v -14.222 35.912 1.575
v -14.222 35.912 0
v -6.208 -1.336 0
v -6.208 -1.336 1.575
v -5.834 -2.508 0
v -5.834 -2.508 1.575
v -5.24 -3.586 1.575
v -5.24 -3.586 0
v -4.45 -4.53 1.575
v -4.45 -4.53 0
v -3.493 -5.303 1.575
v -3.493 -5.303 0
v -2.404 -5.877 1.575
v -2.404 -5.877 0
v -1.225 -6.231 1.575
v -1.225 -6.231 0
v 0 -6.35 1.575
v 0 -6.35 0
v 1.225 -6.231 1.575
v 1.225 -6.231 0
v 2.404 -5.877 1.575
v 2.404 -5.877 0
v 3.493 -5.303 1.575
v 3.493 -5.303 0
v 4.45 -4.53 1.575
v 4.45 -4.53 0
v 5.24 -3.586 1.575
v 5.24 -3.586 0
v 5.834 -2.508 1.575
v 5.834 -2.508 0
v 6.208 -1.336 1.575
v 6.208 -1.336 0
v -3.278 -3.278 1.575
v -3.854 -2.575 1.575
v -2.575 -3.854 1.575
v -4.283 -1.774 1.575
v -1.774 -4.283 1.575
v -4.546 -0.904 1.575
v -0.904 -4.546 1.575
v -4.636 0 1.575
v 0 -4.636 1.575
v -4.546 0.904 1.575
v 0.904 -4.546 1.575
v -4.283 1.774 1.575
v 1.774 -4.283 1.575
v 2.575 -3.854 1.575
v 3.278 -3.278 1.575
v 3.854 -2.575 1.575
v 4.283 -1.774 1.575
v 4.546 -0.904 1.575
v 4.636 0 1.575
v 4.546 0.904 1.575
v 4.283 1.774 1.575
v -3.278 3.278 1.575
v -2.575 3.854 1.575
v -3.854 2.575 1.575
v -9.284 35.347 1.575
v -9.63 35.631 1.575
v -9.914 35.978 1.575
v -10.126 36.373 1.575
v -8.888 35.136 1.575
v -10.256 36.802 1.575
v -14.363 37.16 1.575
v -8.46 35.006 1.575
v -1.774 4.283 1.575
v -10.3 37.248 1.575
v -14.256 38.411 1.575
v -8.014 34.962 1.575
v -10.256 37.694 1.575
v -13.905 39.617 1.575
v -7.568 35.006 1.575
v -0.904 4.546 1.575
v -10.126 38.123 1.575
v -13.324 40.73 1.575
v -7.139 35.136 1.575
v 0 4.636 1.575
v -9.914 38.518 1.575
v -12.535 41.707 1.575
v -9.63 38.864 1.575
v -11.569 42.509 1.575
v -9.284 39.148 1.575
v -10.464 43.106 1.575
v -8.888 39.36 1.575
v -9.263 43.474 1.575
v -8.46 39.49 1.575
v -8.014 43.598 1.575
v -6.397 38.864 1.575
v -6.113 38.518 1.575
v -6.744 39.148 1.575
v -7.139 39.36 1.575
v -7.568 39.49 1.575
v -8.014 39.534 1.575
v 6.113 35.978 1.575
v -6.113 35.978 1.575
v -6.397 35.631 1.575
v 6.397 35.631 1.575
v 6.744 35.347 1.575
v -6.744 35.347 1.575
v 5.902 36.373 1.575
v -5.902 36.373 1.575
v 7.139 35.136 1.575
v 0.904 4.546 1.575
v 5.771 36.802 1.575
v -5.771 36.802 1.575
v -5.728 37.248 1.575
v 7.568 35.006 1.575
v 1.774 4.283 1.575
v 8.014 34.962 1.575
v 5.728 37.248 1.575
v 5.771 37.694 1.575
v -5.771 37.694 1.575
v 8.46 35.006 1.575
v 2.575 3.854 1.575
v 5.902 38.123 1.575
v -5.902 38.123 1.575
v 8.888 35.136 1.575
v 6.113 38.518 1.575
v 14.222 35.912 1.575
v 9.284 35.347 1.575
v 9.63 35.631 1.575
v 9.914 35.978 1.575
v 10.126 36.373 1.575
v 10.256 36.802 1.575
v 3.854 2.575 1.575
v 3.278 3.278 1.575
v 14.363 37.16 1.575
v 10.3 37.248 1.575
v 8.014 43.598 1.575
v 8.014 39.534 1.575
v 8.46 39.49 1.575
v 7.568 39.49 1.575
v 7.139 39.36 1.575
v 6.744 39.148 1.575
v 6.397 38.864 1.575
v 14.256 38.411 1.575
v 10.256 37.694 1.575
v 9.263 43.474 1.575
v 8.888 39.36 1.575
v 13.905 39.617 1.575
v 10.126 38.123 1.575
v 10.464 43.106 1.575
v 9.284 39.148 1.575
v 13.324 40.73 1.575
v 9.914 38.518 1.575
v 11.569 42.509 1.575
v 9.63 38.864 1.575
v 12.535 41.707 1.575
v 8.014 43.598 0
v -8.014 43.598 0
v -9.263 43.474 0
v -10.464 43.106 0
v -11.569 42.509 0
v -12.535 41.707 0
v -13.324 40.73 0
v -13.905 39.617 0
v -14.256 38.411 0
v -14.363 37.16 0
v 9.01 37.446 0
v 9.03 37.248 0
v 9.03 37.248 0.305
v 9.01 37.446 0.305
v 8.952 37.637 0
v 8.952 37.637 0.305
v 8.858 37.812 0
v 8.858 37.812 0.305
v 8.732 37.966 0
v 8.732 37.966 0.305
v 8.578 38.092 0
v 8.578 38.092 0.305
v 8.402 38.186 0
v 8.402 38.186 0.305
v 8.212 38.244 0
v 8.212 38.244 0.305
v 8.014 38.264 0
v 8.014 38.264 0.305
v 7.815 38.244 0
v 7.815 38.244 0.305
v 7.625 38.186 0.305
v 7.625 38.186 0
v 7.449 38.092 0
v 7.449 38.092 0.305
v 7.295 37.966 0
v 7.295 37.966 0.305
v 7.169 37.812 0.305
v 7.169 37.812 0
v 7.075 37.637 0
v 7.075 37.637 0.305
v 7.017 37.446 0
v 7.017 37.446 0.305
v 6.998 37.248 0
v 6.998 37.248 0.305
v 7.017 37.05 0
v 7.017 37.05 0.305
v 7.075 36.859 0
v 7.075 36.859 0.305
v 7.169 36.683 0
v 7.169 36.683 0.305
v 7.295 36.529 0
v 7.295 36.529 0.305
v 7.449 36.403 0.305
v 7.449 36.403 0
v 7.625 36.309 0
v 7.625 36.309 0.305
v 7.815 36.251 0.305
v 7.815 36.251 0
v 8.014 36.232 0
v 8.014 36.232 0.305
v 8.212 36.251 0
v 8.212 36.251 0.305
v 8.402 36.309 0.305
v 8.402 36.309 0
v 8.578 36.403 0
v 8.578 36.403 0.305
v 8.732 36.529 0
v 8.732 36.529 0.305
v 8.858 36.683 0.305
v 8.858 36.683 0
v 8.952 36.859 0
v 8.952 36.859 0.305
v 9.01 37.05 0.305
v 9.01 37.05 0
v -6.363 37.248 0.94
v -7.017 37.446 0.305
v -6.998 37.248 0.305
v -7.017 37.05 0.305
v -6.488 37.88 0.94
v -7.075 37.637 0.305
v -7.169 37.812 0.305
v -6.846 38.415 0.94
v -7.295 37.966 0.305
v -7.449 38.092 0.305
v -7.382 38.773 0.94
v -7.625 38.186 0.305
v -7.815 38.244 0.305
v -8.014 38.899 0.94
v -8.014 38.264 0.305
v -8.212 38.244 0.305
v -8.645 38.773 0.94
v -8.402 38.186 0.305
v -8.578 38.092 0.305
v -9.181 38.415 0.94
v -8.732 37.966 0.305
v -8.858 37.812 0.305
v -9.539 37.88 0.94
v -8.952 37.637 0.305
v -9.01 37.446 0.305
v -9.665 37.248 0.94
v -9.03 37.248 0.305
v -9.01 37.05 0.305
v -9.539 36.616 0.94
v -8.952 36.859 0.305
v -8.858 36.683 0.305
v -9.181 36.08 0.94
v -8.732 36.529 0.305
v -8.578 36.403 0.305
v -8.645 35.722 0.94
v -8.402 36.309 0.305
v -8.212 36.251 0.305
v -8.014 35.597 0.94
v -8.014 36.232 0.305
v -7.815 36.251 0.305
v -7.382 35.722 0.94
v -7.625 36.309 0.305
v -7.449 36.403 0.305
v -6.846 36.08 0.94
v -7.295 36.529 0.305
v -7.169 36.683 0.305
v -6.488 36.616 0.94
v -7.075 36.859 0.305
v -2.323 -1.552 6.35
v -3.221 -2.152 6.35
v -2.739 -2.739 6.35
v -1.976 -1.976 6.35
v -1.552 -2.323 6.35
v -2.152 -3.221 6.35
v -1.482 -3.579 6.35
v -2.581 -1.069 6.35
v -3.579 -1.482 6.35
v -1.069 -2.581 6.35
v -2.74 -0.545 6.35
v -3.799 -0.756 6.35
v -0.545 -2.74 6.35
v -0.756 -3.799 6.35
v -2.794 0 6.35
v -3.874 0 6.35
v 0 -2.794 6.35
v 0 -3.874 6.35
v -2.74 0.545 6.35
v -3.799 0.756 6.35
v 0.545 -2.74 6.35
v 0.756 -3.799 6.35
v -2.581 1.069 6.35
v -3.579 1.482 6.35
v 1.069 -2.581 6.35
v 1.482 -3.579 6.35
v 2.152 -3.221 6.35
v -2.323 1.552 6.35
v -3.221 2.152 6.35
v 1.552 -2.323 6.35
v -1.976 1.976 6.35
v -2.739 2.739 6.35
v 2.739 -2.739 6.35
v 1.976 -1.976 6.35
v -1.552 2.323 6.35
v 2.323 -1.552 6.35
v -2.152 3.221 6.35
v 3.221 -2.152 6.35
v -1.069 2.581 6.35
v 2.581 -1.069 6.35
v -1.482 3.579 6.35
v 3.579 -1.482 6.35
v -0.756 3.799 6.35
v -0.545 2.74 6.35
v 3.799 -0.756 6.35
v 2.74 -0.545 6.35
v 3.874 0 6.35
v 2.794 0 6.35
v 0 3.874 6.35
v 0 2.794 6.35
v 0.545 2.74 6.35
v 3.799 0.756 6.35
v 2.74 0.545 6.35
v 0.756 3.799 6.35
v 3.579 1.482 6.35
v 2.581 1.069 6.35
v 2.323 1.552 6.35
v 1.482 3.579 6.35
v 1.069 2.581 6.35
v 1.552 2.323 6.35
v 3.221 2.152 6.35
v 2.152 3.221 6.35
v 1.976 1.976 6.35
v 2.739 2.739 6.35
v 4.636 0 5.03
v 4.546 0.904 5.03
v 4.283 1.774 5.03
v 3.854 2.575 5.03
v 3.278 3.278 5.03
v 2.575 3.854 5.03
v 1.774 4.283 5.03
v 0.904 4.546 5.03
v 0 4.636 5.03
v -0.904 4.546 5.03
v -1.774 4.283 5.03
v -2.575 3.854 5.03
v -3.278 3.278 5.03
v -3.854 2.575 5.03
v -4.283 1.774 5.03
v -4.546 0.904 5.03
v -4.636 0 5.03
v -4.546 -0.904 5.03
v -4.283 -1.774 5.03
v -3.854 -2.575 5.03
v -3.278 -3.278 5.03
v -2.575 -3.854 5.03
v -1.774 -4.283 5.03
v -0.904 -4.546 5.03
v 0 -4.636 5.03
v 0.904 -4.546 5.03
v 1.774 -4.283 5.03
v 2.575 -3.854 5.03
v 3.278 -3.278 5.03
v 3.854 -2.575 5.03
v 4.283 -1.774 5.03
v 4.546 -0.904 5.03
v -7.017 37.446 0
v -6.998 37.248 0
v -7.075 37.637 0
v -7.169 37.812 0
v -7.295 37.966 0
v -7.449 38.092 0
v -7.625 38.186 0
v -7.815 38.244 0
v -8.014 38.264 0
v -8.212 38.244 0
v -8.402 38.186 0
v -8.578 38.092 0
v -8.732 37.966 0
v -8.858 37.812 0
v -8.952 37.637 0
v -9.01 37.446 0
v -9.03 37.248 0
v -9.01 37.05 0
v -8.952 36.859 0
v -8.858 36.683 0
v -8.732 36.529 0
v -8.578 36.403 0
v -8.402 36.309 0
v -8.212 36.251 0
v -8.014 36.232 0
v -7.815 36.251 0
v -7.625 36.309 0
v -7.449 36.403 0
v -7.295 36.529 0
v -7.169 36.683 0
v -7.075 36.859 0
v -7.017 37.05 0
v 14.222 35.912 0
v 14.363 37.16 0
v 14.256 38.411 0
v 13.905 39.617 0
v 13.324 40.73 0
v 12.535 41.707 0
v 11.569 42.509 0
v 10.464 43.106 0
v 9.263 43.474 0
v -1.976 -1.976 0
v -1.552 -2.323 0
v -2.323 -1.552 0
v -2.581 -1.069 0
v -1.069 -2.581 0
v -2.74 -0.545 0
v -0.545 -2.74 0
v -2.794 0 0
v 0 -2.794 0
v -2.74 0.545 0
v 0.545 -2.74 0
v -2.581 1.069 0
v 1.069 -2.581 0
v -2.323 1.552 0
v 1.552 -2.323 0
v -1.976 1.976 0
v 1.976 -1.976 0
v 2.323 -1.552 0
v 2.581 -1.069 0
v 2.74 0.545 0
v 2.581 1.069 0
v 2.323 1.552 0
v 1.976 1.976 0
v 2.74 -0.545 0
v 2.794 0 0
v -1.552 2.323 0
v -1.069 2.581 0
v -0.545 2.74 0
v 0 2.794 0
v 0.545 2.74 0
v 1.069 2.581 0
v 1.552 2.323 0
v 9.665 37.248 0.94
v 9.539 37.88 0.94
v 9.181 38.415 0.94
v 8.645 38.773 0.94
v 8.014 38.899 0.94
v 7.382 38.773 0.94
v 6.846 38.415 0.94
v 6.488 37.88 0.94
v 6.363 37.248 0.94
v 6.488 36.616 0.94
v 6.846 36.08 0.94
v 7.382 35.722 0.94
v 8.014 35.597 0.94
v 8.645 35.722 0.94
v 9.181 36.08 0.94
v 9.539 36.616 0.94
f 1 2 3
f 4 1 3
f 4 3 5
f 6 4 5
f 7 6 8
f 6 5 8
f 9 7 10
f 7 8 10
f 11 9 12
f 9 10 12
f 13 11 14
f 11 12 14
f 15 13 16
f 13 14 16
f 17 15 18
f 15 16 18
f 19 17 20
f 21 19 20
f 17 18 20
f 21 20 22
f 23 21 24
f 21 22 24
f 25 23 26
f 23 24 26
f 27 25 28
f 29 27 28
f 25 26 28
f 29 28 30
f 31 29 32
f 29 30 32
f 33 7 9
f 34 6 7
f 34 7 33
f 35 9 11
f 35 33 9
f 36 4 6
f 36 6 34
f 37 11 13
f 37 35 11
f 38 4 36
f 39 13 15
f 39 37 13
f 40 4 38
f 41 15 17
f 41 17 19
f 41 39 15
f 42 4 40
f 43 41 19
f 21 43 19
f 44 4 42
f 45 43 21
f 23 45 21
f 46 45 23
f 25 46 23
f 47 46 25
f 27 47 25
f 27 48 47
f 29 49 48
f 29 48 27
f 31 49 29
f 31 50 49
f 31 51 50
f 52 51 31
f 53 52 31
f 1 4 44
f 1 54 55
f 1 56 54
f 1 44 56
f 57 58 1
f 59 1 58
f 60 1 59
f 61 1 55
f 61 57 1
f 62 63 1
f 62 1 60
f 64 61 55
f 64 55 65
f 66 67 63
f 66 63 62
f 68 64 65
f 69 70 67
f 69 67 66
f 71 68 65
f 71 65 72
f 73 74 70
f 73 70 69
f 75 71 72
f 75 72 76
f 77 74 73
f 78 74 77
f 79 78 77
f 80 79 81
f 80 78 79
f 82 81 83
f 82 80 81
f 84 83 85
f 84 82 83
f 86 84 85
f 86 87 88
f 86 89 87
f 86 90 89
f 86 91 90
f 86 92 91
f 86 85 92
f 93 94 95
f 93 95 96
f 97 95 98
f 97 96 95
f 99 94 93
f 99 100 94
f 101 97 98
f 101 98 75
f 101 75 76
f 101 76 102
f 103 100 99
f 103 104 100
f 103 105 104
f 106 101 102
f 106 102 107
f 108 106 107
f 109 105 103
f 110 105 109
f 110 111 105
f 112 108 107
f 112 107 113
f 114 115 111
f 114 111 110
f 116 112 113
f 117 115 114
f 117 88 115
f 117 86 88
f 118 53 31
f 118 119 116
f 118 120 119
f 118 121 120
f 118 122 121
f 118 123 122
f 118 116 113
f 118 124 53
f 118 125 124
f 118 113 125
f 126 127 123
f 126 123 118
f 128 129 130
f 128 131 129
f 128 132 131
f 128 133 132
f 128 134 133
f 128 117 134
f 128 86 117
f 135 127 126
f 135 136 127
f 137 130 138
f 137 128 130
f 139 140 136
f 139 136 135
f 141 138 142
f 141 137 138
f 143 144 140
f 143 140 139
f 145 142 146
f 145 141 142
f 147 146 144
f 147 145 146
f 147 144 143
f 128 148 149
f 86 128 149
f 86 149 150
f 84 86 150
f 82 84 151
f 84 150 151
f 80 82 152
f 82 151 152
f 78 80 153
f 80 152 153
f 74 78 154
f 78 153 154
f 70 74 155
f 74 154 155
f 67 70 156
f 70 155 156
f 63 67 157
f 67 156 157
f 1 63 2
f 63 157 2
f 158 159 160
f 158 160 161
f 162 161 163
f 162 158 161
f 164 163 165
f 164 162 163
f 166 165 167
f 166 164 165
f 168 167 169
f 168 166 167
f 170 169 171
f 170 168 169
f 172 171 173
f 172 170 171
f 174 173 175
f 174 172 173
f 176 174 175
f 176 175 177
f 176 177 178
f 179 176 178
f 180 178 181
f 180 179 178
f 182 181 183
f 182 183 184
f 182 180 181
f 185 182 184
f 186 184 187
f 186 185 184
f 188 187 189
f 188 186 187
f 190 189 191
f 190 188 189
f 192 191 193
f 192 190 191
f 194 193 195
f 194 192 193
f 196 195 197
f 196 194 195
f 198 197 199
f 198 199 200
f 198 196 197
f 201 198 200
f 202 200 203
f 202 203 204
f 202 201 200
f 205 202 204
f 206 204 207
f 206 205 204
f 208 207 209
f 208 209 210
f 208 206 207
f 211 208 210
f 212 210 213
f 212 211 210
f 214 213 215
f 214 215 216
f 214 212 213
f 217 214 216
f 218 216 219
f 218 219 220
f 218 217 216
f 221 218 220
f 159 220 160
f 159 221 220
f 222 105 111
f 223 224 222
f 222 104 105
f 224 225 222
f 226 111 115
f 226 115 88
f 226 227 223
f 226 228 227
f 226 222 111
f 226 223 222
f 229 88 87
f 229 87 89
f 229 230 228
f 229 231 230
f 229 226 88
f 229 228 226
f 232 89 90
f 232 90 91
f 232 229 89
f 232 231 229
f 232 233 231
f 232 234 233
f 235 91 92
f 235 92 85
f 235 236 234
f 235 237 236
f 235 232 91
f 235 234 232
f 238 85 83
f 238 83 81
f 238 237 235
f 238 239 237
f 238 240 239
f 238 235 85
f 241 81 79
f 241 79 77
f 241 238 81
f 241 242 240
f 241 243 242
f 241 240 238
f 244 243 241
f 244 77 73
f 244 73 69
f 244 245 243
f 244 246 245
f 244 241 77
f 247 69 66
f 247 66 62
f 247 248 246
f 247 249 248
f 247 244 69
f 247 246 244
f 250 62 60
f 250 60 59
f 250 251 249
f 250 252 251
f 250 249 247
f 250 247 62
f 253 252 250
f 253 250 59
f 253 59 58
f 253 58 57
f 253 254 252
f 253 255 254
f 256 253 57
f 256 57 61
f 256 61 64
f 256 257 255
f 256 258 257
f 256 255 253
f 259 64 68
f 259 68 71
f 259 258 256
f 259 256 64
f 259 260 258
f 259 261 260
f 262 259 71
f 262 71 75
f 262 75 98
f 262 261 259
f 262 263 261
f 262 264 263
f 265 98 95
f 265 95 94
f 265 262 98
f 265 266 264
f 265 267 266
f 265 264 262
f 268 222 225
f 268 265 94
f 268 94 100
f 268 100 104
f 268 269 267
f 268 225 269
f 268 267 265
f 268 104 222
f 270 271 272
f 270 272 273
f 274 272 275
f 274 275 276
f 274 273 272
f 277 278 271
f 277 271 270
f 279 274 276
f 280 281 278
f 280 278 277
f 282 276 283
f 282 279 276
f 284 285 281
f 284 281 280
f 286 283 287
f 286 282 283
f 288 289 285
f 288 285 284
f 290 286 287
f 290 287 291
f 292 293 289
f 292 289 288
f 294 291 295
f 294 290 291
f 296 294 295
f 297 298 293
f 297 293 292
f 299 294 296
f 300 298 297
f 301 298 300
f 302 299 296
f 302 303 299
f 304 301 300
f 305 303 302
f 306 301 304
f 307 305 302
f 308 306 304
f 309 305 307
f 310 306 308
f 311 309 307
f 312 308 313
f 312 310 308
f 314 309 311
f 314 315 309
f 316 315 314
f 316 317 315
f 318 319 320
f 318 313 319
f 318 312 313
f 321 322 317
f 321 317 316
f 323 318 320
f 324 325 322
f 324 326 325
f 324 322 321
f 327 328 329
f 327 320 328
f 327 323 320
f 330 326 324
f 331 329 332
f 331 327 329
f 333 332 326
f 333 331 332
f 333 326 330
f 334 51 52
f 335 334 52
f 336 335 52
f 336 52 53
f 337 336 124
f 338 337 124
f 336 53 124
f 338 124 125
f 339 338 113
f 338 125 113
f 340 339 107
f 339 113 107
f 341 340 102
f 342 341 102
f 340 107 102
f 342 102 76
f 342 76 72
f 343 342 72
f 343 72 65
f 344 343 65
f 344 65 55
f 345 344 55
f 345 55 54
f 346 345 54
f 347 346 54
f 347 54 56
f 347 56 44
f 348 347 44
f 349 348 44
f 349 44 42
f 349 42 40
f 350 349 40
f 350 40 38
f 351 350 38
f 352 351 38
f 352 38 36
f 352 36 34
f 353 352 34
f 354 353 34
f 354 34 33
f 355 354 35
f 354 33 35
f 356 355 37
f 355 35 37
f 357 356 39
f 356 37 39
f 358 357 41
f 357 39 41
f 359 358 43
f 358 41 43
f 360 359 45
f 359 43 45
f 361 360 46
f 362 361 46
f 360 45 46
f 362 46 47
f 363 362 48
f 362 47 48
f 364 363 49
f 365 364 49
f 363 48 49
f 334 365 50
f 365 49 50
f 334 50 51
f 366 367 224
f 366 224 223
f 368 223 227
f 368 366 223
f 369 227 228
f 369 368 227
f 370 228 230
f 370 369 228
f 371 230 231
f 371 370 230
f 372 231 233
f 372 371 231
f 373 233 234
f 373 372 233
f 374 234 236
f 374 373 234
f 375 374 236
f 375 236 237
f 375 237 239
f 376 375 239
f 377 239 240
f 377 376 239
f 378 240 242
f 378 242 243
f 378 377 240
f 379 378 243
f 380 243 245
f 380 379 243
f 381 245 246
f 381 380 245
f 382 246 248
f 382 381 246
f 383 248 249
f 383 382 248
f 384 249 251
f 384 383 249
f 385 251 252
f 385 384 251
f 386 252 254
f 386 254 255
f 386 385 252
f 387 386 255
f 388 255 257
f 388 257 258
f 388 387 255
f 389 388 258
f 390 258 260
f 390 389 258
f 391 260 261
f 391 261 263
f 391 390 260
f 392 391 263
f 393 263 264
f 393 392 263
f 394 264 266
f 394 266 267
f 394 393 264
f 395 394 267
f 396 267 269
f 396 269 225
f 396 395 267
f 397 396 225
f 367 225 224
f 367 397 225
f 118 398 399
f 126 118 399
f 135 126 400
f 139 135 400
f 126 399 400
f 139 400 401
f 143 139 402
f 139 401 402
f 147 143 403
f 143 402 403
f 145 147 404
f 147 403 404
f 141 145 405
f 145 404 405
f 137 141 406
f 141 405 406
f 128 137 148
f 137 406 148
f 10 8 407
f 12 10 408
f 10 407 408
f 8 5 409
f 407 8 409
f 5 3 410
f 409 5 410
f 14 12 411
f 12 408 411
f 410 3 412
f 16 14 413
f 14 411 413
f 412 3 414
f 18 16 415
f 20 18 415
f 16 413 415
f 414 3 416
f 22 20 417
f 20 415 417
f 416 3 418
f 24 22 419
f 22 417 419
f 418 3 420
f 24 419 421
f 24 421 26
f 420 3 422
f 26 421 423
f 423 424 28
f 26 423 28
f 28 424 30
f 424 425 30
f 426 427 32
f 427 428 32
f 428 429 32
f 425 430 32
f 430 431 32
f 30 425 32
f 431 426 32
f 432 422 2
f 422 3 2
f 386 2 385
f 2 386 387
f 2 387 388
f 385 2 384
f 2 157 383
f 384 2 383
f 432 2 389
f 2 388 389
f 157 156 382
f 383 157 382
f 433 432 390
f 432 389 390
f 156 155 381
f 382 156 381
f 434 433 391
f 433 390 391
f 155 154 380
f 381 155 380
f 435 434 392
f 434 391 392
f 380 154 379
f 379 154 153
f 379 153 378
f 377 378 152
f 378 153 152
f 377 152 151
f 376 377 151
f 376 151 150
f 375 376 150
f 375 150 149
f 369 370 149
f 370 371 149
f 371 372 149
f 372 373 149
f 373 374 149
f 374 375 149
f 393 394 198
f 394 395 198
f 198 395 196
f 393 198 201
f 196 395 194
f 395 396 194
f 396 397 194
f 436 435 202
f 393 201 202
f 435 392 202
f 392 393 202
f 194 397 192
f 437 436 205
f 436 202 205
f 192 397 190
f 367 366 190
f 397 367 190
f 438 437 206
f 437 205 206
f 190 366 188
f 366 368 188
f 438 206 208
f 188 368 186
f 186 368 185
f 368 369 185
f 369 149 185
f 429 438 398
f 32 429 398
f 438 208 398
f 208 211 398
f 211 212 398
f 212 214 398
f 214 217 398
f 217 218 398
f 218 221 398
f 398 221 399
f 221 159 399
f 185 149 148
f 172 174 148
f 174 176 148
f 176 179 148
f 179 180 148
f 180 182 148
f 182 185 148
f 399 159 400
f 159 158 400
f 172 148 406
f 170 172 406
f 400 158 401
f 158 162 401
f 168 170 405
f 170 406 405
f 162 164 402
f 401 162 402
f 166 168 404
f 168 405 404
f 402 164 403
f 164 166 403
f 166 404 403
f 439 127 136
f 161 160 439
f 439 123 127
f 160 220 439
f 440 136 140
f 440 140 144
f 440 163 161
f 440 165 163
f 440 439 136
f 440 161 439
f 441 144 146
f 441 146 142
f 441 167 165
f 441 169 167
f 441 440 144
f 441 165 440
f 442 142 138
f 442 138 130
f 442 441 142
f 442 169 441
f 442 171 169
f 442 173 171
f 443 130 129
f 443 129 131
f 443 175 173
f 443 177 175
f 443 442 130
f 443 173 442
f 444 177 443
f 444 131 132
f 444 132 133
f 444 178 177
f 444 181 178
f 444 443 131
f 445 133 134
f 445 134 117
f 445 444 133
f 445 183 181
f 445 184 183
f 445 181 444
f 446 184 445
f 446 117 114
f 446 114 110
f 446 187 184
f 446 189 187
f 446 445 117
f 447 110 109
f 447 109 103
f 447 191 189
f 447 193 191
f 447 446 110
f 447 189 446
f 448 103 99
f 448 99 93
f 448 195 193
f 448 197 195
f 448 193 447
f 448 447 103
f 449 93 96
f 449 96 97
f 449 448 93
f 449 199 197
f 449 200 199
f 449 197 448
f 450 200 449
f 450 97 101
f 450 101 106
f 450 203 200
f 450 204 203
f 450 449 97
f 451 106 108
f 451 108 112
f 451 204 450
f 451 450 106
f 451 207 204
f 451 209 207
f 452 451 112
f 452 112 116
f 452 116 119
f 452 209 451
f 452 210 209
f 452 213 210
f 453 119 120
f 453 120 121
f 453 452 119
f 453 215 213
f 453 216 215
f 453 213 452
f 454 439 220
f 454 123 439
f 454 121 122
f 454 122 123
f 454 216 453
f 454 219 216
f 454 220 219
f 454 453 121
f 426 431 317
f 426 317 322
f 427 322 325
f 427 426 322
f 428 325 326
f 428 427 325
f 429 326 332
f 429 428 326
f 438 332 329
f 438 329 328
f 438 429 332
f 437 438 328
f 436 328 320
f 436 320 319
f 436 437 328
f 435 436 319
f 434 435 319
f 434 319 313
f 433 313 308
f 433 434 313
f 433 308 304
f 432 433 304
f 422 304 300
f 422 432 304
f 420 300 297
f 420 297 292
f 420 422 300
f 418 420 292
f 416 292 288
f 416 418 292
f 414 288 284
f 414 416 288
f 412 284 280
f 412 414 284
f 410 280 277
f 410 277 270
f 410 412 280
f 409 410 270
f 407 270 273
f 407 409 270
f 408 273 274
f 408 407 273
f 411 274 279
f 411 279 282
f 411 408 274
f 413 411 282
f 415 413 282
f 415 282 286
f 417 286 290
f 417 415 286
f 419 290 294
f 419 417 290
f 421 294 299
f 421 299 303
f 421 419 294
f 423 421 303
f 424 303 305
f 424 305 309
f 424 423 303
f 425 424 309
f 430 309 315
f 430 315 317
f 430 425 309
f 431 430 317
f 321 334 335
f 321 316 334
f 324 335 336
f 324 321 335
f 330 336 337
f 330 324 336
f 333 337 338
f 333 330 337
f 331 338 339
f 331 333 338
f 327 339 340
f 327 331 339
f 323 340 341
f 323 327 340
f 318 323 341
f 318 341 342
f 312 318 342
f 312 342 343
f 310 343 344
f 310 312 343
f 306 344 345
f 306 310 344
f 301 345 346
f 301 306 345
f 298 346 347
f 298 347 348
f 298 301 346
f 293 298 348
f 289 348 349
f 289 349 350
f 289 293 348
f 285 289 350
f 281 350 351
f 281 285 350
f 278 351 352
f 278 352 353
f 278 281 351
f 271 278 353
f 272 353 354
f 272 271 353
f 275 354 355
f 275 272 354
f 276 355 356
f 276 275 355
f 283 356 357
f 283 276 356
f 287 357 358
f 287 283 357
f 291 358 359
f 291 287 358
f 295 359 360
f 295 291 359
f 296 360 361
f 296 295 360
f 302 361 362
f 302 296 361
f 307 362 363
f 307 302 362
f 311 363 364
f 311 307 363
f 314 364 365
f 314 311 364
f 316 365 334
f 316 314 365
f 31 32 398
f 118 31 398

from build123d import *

# Parameters (mm, degrees)
F0_R     = 4.6355
F0_R_2   = 1.016
F1_DEPTH = 1.5748
F0_R_3   = 2.794
F2_DEPTH = 6.35
F3_SIZE  = 1.27


# Not quite as in the source:
# - a fillet or chamfer that OpenCascade refuses, or shapes differently, is made with other operations: its cross-section is extruded or revolved along the edge and cut away or added
# - a feature names something its author has since deleted; it is built from what else it names


with BuildPart() as f1:
    # F0 (on Top) → F1 (new body)
    with BuildSketch(Plane.XY):
        with BuildLine():
            Line((-14.2215059748, 35.912132599), (-6.2079540965, -1.3355919797))
            ThreePointArc((-6.2079540965, -1.3355919797), (0, -6.35), (6.2079540965, -1.3355919797))
            Line((6.2079540965, -1.3355919797), (14.2215059748, 35.912132599))
            ThreePointArc((14.2215059748, 35.912132599), (12.9533650869, 41.2378054632), (8.0135518783, 43.5977245787))
            Line((8.0135518783, 43.5977245787), (-8.0135518783, 43.5977245787))
            ThreePointArc((-8.0135518783, 43.5977245787), (-12.9533650869, 41.2378054632), (-14.2215059748, 35.912132599))
        make_face()
        Circle(F0_R, mode=Mode.SUBTRACT)
        with Locations((-8.0135518783, 37.2477245787)):
            Circle(F0_R_2, mode=Mode.SUBTRACT)
        with Locations((8.0135518783, 37.2477245787)):
            Circle(F0_R_2, mode=Mode.SUBTRACT)
    extrude(amount=F1_DEPTH)

    # F0 (on Top) → F2 (join)
    with BuildSketch(Plane.XY):
        Circle(F0_R)
        Circle(F0_R_3, mode=Mode.SUBTRACT)
    extrude(amount=F2_DEPTH)

    # F3
    f3_edges = [f1.edges().sort_by_distance(p)[0] for p in [
        (-9.029552, 37.247725, 1.5748),
        (6.997552, 37.247725, 1.5748),
    ]]
    chamfer(f3_edges, length=F3_SIZE)

    # F4: chamfer of 0.762 x 1.3198227154 on 1 edges, made by hand

    # F4_s1 → F4_t2 (revolve, cut)
    with BuildSketch(Plane.XZ):
        Polygon((4.6355, 5.0301772846), (3.8735, 6.35), (4.6355, 6.35), align=None)
    revolve(axis=Axis((0, 0, 6.35), (0, 0, 1)), mode=Mode.SUBTRACT)


solid = f1.part
